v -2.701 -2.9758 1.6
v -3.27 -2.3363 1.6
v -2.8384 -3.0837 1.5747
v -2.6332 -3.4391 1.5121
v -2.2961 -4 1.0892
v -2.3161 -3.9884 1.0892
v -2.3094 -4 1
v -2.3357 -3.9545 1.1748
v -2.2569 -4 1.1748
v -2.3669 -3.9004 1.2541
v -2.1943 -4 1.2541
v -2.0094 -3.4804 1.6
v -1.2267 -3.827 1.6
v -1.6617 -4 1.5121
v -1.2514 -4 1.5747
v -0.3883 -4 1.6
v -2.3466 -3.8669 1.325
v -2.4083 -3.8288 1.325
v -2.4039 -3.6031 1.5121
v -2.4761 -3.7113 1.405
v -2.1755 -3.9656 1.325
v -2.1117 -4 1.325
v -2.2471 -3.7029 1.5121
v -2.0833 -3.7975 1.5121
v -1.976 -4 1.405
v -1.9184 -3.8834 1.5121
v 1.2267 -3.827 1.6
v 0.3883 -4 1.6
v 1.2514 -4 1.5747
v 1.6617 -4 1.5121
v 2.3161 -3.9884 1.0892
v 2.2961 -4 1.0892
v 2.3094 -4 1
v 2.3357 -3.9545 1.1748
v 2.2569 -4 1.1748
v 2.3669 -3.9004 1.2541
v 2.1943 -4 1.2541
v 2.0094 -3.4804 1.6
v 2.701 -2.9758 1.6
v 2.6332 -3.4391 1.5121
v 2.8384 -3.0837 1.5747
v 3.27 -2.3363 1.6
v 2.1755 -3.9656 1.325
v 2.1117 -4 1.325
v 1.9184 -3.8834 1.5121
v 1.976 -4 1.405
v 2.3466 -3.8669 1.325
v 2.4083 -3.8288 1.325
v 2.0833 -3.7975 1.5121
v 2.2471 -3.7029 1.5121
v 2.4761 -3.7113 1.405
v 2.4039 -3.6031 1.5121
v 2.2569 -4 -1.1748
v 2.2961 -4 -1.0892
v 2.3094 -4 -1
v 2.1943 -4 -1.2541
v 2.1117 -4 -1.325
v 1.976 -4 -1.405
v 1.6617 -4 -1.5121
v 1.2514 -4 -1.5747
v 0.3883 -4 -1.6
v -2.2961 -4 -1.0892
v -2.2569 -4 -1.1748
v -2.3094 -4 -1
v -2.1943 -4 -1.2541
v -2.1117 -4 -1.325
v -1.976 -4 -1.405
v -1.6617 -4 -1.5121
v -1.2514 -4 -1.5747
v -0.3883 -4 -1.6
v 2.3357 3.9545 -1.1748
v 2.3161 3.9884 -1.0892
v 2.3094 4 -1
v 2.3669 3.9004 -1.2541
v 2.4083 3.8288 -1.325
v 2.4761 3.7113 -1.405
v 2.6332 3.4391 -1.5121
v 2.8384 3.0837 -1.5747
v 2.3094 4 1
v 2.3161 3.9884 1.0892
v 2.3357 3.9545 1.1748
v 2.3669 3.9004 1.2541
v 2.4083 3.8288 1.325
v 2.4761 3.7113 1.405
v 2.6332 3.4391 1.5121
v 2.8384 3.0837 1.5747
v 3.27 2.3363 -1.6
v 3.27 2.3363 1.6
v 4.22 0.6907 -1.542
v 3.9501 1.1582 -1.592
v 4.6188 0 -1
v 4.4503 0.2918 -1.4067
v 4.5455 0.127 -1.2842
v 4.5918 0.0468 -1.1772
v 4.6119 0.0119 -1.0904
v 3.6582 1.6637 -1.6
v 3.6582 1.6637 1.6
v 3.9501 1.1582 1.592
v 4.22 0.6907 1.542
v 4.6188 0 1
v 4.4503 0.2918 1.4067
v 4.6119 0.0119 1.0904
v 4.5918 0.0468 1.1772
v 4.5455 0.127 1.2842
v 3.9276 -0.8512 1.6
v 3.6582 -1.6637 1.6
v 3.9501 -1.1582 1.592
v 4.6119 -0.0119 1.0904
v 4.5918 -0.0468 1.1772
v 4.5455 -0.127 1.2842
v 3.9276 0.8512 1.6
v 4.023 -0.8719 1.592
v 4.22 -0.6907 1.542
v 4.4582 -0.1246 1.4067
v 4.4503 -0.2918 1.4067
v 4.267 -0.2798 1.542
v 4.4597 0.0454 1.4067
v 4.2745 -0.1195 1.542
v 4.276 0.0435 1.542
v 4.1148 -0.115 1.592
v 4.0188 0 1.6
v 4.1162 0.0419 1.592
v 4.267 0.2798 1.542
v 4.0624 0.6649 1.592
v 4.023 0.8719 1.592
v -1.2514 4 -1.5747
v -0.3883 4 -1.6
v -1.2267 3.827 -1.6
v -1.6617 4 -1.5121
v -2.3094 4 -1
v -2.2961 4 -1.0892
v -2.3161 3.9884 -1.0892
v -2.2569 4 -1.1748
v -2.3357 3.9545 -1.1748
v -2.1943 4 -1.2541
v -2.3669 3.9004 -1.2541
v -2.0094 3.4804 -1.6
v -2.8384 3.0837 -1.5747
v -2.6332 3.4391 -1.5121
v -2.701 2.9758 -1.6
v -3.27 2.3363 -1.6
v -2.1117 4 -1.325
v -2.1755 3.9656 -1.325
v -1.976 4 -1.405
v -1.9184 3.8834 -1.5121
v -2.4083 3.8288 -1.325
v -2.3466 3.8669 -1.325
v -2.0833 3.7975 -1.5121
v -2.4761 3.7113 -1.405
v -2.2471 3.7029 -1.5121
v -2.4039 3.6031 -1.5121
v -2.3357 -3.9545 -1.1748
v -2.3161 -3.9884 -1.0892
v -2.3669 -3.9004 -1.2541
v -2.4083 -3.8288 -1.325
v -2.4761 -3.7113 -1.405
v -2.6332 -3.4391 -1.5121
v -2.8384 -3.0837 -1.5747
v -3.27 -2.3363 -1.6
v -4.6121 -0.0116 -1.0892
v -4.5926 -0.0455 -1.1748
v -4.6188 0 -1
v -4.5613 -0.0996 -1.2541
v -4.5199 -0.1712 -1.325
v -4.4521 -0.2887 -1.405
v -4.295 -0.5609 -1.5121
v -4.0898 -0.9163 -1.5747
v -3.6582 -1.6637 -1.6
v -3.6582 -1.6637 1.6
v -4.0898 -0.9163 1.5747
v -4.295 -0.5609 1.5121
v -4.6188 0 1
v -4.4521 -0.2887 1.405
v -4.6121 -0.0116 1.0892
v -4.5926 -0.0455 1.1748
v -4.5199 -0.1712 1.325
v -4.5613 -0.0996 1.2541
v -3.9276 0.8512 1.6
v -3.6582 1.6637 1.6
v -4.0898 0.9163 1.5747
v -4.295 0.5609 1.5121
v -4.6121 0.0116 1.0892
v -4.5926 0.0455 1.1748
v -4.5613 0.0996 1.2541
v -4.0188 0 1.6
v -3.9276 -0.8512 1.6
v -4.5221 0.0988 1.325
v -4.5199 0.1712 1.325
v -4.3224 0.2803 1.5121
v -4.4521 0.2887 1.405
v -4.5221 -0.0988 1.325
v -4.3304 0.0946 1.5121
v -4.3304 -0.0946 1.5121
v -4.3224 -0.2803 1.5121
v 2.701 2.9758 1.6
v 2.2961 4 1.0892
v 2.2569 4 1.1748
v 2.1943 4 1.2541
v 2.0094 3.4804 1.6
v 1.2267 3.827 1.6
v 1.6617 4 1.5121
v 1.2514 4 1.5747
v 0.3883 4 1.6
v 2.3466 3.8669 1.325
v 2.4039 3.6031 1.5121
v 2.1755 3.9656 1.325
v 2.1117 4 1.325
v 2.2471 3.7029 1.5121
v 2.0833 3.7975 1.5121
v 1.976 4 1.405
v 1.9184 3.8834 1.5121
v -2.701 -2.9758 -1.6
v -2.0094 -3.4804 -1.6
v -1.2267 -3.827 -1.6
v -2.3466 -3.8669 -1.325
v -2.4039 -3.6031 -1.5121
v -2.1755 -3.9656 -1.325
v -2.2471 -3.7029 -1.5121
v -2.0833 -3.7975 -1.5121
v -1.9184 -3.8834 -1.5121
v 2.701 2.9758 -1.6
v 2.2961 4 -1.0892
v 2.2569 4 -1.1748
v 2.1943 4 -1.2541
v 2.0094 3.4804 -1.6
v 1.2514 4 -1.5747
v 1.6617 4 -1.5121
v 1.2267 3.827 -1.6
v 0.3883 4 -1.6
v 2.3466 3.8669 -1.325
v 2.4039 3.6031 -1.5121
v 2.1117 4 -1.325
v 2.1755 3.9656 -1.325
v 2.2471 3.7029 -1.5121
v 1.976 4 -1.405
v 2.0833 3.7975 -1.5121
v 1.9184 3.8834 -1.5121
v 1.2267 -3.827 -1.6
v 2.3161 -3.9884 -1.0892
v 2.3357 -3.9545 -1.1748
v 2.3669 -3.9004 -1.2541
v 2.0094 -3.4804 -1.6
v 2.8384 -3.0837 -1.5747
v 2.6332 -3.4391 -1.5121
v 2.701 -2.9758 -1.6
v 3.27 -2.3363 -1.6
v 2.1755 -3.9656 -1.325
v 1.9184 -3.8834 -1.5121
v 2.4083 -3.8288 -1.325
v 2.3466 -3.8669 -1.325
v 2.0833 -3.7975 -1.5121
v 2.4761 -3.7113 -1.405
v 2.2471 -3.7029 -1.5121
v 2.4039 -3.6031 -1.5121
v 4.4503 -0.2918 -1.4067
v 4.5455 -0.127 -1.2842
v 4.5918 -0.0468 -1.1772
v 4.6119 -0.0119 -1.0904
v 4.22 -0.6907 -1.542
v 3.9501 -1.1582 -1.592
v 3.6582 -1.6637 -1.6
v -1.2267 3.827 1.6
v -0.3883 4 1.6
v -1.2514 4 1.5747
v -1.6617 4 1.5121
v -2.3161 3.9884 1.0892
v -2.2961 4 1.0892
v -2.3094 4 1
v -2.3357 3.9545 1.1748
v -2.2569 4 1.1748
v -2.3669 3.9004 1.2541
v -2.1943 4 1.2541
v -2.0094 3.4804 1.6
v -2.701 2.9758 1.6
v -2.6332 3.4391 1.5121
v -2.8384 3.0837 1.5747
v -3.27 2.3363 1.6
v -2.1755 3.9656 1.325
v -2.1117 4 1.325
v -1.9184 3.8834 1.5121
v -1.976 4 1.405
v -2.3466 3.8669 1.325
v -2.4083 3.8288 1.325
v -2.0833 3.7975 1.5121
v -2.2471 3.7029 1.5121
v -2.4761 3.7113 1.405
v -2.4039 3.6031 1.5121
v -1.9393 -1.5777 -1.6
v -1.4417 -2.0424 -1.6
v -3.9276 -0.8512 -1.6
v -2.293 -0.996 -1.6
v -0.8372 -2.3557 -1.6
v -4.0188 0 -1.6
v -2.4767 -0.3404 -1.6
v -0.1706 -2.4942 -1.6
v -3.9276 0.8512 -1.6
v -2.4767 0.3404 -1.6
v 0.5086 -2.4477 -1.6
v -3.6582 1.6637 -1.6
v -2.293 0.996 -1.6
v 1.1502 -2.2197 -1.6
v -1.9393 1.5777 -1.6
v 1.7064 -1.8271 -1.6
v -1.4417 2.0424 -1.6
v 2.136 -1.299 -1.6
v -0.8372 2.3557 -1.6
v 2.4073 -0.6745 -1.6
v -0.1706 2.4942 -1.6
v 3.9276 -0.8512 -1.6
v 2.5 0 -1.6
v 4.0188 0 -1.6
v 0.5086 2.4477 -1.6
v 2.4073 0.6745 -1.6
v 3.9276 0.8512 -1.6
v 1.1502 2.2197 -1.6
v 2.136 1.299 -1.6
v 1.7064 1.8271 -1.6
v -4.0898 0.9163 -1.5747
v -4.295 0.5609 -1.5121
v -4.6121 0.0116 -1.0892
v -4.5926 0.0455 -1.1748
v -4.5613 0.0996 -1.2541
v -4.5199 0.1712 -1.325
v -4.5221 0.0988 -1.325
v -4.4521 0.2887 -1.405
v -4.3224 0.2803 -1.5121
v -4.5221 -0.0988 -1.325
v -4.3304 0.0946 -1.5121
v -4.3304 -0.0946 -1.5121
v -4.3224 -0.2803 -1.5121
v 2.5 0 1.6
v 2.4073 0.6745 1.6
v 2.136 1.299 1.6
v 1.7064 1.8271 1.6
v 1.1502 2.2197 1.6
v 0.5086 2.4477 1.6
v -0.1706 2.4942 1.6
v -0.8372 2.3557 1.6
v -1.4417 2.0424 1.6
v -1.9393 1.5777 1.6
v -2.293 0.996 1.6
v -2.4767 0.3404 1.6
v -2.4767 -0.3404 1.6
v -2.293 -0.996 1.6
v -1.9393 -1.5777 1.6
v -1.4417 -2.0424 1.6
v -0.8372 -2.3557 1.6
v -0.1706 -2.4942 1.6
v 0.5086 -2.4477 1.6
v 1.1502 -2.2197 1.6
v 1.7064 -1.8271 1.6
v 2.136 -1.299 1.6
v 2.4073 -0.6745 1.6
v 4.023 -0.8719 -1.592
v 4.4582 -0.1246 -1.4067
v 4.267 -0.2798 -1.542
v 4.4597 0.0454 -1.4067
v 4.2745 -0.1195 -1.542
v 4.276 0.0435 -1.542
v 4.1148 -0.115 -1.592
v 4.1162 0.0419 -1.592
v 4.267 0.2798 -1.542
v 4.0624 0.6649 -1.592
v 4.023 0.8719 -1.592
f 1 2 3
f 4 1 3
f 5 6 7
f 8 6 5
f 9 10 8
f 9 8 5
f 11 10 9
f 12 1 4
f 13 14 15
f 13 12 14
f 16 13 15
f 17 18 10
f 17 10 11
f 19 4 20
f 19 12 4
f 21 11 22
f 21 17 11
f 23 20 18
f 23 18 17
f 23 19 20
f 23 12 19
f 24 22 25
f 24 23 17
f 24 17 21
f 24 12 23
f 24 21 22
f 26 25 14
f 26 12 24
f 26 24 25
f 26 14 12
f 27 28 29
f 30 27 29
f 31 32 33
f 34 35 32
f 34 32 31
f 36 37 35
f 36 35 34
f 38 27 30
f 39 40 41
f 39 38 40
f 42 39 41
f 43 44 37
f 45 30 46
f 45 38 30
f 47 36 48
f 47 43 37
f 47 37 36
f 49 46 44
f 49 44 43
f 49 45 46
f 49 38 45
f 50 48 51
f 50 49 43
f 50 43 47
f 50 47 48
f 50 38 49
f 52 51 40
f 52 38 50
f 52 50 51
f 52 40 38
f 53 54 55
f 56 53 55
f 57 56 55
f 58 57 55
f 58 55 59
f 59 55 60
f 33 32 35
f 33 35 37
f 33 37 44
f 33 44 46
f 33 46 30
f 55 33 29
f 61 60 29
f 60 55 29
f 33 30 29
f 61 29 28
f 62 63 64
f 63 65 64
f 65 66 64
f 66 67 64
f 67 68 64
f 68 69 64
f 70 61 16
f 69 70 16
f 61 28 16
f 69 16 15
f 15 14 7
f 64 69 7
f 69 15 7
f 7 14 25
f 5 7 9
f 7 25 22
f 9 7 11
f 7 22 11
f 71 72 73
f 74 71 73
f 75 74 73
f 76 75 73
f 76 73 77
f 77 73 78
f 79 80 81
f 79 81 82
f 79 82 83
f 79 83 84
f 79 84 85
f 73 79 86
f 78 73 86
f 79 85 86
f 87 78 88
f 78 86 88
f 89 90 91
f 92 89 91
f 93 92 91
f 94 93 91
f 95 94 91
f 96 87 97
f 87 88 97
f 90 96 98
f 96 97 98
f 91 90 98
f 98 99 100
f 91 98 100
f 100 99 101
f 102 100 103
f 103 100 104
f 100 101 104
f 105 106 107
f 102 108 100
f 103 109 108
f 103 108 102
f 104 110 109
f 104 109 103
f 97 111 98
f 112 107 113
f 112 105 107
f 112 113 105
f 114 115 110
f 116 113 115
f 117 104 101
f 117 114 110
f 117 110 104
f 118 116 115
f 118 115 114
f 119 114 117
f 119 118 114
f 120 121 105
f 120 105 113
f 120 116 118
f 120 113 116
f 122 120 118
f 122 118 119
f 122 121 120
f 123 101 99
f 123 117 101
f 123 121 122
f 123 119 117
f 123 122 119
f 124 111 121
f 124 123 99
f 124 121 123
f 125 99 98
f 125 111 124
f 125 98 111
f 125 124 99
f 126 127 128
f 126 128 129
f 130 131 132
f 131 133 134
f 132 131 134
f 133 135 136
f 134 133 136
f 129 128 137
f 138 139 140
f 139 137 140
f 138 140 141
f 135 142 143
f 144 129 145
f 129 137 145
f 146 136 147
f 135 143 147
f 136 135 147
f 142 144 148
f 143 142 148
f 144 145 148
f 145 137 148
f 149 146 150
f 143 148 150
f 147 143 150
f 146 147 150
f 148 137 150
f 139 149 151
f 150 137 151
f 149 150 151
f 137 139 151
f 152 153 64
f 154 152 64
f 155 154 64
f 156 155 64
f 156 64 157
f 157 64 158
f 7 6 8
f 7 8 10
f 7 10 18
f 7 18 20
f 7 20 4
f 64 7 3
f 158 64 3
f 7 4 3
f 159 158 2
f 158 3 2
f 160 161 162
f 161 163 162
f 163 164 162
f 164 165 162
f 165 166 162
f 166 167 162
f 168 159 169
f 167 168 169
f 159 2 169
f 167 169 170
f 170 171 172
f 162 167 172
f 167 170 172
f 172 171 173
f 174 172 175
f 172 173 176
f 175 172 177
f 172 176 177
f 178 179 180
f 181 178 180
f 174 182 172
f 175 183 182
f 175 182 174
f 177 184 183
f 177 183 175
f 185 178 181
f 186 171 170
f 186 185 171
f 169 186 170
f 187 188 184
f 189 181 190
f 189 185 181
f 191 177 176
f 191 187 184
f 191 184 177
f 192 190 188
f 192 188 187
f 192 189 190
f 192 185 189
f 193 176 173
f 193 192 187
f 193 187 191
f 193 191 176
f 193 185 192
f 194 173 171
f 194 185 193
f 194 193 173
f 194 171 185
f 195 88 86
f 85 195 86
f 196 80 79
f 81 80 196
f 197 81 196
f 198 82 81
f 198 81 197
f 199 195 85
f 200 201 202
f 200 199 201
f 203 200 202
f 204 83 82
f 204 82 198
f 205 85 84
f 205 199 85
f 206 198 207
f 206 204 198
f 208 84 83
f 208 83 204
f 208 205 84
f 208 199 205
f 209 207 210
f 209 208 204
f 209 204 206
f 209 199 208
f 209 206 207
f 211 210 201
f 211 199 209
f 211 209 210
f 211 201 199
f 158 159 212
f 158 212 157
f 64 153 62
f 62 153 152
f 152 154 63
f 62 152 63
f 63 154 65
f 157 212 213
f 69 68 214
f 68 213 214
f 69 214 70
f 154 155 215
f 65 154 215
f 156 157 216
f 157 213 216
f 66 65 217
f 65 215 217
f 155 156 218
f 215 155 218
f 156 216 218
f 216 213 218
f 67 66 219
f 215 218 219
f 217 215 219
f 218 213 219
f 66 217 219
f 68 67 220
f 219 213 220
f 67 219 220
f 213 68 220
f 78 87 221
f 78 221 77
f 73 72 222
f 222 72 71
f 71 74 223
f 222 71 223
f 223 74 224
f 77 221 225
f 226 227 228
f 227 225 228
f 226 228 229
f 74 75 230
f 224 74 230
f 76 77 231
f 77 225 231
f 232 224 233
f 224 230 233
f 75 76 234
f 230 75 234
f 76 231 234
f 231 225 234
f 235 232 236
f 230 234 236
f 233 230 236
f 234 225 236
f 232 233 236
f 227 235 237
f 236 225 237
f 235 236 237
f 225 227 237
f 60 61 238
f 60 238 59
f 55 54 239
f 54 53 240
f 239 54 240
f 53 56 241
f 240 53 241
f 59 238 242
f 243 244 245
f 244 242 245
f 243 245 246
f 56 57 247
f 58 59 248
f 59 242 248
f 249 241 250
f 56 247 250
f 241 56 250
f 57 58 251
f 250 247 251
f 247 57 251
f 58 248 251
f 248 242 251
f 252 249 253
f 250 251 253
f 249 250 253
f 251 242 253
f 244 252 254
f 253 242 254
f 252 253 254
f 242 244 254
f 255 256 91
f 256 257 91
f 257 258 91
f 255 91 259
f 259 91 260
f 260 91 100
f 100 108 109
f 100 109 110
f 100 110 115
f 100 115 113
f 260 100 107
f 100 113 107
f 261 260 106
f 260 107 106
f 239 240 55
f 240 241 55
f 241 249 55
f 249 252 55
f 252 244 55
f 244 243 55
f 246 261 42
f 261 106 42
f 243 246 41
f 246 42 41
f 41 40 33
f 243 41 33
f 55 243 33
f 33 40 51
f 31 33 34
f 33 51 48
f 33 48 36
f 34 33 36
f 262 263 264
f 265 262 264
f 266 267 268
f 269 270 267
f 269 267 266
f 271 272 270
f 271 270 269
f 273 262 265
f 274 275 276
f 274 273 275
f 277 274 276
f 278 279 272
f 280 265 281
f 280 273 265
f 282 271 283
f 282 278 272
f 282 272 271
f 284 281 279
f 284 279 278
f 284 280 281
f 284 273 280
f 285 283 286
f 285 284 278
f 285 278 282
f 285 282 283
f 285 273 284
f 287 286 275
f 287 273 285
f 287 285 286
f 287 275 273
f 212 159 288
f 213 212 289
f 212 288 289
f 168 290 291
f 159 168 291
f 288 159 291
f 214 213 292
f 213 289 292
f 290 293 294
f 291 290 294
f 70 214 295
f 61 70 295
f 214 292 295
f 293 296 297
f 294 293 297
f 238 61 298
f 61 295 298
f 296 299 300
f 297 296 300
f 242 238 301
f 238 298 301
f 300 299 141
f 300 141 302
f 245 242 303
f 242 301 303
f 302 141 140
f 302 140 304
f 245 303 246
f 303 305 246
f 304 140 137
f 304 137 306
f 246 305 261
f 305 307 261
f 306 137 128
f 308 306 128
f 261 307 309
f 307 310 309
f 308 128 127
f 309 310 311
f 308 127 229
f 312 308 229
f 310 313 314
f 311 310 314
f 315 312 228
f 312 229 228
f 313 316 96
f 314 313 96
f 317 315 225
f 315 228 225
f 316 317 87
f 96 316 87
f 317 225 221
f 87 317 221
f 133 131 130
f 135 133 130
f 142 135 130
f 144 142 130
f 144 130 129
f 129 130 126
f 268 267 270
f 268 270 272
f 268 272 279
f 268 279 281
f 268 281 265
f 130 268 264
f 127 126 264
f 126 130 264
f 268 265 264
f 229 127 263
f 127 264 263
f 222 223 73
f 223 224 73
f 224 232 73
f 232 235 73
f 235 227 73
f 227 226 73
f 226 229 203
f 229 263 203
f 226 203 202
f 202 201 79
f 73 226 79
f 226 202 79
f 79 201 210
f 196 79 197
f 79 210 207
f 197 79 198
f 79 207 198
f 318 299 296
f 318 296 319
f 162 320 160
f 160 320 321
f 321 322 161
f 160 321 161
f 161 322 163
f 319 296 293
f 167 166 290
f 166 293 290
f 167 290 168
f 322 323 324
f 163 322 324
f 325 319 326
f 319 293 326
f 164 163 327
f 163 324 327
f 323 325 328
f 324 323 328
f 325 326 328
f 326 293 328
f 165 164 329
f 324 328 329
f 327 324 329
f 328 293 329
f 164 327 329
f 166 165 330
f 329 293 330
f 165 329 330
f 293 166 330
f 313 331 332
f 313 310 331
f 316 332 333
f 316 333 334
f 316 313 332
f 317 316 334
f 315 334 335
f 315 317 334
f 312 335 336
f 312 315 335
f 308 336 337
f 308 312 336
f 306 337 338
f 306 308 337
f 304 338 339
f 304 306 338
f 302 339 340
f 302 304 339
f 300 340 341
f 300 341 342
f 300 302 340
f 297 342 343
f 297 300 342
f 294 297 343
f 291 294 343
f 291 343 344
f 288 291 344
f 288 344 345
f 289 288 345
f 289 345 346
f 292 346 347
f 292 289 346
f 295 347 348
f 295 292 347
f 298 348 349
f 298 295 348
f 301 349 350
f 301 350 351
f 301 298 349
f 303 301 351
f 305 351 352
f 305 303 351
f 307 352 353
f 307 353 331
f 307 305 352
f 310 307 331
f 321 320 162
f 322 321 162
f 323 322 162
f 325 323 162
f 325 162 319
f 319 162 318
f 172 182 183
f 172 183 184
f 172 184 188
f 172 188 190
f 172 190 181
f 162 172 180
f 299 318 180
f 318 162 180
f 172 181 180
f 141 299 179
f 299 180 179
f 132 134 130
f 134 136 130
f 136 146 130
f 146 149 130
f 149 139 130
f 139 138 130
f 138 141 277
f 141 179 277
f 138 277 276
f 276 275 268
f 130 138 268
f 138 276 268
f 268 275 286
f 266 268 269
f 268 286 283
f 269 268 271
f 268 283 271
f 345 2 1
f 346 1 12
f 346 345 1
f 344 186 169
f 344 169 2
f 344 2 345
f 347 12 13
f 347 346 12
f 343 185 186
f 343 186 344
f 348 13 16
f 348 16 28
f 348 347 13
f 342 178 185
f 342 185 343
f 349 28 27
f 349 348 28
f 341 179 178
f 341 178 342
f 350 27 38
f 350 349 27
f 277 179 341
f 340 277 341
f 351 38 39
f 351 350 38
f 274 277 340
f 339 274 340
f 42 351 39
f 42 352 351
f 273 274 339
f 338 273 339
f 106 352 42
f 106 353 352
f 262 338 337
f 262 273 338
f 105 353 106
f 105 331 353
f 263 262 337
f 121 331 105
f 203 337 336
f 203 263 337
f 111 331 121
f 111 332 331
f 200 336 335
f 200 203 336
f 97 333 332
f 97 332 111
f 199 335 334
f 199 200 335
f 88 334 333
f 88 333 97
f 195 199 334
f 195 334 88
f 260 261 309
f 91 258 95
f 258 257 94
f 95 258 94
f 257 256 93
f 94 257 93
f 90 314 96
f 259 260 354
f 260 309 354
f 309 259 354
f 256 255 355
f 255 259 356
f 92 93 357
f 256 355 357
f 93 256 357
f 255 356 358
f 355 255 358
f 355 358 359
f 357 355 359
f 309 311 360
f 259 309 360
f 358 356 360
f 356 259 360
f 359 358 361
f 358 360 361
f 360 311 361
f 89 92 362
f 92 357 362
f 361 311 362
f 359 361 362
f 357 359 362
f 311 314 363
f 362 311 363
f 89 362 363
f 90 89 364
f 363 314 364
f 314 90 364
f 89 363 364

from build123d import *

# Parameters (mm, degrees)
F0_R     = 4.6188021535
F0_R_2   = 2.5
F1_DEPTH = 1.6
F2_R     = 0.6
F3_R     = 7.5
F4_DEPTH = 3.2010001


with BuildPart() as f1:
    # F0 (on Top) → F1 (new body, symmetric)
    with BuildSketch(Plane.XY):
        Circle(F0_R)
        Circle(F0_R_2, mode=Mode.SUBTRACT)
    extrude(amount=F1_DEPTH, both=True)

    # F2
    f2_edges = [f1.edges().sort_by_distance(p)[0] for p in [
        (-4.618802, 0, 1.6),
        (-4.618802, 0, -1.6),
    ]]
    fillet(f2_edges, radius=F2_R)

    # F3 (on face) → F4 (cut, through all)
    with BuildSketch(Plane.XY.offset(1.6)):
        Circle(F3_R)
        Polygon((-2.3094010768, -4), (-4.6188021535, 0), (-2.3094010768, 4), (2.3094010768, 4), (4.6188021535, 0), (2.3094010768, -4), align=None, mode=Mode.SUBTRACT)
    extrude(amount=-F4_DEPTH, mode=Mode.SUBTRACT)


solid = f1.part
